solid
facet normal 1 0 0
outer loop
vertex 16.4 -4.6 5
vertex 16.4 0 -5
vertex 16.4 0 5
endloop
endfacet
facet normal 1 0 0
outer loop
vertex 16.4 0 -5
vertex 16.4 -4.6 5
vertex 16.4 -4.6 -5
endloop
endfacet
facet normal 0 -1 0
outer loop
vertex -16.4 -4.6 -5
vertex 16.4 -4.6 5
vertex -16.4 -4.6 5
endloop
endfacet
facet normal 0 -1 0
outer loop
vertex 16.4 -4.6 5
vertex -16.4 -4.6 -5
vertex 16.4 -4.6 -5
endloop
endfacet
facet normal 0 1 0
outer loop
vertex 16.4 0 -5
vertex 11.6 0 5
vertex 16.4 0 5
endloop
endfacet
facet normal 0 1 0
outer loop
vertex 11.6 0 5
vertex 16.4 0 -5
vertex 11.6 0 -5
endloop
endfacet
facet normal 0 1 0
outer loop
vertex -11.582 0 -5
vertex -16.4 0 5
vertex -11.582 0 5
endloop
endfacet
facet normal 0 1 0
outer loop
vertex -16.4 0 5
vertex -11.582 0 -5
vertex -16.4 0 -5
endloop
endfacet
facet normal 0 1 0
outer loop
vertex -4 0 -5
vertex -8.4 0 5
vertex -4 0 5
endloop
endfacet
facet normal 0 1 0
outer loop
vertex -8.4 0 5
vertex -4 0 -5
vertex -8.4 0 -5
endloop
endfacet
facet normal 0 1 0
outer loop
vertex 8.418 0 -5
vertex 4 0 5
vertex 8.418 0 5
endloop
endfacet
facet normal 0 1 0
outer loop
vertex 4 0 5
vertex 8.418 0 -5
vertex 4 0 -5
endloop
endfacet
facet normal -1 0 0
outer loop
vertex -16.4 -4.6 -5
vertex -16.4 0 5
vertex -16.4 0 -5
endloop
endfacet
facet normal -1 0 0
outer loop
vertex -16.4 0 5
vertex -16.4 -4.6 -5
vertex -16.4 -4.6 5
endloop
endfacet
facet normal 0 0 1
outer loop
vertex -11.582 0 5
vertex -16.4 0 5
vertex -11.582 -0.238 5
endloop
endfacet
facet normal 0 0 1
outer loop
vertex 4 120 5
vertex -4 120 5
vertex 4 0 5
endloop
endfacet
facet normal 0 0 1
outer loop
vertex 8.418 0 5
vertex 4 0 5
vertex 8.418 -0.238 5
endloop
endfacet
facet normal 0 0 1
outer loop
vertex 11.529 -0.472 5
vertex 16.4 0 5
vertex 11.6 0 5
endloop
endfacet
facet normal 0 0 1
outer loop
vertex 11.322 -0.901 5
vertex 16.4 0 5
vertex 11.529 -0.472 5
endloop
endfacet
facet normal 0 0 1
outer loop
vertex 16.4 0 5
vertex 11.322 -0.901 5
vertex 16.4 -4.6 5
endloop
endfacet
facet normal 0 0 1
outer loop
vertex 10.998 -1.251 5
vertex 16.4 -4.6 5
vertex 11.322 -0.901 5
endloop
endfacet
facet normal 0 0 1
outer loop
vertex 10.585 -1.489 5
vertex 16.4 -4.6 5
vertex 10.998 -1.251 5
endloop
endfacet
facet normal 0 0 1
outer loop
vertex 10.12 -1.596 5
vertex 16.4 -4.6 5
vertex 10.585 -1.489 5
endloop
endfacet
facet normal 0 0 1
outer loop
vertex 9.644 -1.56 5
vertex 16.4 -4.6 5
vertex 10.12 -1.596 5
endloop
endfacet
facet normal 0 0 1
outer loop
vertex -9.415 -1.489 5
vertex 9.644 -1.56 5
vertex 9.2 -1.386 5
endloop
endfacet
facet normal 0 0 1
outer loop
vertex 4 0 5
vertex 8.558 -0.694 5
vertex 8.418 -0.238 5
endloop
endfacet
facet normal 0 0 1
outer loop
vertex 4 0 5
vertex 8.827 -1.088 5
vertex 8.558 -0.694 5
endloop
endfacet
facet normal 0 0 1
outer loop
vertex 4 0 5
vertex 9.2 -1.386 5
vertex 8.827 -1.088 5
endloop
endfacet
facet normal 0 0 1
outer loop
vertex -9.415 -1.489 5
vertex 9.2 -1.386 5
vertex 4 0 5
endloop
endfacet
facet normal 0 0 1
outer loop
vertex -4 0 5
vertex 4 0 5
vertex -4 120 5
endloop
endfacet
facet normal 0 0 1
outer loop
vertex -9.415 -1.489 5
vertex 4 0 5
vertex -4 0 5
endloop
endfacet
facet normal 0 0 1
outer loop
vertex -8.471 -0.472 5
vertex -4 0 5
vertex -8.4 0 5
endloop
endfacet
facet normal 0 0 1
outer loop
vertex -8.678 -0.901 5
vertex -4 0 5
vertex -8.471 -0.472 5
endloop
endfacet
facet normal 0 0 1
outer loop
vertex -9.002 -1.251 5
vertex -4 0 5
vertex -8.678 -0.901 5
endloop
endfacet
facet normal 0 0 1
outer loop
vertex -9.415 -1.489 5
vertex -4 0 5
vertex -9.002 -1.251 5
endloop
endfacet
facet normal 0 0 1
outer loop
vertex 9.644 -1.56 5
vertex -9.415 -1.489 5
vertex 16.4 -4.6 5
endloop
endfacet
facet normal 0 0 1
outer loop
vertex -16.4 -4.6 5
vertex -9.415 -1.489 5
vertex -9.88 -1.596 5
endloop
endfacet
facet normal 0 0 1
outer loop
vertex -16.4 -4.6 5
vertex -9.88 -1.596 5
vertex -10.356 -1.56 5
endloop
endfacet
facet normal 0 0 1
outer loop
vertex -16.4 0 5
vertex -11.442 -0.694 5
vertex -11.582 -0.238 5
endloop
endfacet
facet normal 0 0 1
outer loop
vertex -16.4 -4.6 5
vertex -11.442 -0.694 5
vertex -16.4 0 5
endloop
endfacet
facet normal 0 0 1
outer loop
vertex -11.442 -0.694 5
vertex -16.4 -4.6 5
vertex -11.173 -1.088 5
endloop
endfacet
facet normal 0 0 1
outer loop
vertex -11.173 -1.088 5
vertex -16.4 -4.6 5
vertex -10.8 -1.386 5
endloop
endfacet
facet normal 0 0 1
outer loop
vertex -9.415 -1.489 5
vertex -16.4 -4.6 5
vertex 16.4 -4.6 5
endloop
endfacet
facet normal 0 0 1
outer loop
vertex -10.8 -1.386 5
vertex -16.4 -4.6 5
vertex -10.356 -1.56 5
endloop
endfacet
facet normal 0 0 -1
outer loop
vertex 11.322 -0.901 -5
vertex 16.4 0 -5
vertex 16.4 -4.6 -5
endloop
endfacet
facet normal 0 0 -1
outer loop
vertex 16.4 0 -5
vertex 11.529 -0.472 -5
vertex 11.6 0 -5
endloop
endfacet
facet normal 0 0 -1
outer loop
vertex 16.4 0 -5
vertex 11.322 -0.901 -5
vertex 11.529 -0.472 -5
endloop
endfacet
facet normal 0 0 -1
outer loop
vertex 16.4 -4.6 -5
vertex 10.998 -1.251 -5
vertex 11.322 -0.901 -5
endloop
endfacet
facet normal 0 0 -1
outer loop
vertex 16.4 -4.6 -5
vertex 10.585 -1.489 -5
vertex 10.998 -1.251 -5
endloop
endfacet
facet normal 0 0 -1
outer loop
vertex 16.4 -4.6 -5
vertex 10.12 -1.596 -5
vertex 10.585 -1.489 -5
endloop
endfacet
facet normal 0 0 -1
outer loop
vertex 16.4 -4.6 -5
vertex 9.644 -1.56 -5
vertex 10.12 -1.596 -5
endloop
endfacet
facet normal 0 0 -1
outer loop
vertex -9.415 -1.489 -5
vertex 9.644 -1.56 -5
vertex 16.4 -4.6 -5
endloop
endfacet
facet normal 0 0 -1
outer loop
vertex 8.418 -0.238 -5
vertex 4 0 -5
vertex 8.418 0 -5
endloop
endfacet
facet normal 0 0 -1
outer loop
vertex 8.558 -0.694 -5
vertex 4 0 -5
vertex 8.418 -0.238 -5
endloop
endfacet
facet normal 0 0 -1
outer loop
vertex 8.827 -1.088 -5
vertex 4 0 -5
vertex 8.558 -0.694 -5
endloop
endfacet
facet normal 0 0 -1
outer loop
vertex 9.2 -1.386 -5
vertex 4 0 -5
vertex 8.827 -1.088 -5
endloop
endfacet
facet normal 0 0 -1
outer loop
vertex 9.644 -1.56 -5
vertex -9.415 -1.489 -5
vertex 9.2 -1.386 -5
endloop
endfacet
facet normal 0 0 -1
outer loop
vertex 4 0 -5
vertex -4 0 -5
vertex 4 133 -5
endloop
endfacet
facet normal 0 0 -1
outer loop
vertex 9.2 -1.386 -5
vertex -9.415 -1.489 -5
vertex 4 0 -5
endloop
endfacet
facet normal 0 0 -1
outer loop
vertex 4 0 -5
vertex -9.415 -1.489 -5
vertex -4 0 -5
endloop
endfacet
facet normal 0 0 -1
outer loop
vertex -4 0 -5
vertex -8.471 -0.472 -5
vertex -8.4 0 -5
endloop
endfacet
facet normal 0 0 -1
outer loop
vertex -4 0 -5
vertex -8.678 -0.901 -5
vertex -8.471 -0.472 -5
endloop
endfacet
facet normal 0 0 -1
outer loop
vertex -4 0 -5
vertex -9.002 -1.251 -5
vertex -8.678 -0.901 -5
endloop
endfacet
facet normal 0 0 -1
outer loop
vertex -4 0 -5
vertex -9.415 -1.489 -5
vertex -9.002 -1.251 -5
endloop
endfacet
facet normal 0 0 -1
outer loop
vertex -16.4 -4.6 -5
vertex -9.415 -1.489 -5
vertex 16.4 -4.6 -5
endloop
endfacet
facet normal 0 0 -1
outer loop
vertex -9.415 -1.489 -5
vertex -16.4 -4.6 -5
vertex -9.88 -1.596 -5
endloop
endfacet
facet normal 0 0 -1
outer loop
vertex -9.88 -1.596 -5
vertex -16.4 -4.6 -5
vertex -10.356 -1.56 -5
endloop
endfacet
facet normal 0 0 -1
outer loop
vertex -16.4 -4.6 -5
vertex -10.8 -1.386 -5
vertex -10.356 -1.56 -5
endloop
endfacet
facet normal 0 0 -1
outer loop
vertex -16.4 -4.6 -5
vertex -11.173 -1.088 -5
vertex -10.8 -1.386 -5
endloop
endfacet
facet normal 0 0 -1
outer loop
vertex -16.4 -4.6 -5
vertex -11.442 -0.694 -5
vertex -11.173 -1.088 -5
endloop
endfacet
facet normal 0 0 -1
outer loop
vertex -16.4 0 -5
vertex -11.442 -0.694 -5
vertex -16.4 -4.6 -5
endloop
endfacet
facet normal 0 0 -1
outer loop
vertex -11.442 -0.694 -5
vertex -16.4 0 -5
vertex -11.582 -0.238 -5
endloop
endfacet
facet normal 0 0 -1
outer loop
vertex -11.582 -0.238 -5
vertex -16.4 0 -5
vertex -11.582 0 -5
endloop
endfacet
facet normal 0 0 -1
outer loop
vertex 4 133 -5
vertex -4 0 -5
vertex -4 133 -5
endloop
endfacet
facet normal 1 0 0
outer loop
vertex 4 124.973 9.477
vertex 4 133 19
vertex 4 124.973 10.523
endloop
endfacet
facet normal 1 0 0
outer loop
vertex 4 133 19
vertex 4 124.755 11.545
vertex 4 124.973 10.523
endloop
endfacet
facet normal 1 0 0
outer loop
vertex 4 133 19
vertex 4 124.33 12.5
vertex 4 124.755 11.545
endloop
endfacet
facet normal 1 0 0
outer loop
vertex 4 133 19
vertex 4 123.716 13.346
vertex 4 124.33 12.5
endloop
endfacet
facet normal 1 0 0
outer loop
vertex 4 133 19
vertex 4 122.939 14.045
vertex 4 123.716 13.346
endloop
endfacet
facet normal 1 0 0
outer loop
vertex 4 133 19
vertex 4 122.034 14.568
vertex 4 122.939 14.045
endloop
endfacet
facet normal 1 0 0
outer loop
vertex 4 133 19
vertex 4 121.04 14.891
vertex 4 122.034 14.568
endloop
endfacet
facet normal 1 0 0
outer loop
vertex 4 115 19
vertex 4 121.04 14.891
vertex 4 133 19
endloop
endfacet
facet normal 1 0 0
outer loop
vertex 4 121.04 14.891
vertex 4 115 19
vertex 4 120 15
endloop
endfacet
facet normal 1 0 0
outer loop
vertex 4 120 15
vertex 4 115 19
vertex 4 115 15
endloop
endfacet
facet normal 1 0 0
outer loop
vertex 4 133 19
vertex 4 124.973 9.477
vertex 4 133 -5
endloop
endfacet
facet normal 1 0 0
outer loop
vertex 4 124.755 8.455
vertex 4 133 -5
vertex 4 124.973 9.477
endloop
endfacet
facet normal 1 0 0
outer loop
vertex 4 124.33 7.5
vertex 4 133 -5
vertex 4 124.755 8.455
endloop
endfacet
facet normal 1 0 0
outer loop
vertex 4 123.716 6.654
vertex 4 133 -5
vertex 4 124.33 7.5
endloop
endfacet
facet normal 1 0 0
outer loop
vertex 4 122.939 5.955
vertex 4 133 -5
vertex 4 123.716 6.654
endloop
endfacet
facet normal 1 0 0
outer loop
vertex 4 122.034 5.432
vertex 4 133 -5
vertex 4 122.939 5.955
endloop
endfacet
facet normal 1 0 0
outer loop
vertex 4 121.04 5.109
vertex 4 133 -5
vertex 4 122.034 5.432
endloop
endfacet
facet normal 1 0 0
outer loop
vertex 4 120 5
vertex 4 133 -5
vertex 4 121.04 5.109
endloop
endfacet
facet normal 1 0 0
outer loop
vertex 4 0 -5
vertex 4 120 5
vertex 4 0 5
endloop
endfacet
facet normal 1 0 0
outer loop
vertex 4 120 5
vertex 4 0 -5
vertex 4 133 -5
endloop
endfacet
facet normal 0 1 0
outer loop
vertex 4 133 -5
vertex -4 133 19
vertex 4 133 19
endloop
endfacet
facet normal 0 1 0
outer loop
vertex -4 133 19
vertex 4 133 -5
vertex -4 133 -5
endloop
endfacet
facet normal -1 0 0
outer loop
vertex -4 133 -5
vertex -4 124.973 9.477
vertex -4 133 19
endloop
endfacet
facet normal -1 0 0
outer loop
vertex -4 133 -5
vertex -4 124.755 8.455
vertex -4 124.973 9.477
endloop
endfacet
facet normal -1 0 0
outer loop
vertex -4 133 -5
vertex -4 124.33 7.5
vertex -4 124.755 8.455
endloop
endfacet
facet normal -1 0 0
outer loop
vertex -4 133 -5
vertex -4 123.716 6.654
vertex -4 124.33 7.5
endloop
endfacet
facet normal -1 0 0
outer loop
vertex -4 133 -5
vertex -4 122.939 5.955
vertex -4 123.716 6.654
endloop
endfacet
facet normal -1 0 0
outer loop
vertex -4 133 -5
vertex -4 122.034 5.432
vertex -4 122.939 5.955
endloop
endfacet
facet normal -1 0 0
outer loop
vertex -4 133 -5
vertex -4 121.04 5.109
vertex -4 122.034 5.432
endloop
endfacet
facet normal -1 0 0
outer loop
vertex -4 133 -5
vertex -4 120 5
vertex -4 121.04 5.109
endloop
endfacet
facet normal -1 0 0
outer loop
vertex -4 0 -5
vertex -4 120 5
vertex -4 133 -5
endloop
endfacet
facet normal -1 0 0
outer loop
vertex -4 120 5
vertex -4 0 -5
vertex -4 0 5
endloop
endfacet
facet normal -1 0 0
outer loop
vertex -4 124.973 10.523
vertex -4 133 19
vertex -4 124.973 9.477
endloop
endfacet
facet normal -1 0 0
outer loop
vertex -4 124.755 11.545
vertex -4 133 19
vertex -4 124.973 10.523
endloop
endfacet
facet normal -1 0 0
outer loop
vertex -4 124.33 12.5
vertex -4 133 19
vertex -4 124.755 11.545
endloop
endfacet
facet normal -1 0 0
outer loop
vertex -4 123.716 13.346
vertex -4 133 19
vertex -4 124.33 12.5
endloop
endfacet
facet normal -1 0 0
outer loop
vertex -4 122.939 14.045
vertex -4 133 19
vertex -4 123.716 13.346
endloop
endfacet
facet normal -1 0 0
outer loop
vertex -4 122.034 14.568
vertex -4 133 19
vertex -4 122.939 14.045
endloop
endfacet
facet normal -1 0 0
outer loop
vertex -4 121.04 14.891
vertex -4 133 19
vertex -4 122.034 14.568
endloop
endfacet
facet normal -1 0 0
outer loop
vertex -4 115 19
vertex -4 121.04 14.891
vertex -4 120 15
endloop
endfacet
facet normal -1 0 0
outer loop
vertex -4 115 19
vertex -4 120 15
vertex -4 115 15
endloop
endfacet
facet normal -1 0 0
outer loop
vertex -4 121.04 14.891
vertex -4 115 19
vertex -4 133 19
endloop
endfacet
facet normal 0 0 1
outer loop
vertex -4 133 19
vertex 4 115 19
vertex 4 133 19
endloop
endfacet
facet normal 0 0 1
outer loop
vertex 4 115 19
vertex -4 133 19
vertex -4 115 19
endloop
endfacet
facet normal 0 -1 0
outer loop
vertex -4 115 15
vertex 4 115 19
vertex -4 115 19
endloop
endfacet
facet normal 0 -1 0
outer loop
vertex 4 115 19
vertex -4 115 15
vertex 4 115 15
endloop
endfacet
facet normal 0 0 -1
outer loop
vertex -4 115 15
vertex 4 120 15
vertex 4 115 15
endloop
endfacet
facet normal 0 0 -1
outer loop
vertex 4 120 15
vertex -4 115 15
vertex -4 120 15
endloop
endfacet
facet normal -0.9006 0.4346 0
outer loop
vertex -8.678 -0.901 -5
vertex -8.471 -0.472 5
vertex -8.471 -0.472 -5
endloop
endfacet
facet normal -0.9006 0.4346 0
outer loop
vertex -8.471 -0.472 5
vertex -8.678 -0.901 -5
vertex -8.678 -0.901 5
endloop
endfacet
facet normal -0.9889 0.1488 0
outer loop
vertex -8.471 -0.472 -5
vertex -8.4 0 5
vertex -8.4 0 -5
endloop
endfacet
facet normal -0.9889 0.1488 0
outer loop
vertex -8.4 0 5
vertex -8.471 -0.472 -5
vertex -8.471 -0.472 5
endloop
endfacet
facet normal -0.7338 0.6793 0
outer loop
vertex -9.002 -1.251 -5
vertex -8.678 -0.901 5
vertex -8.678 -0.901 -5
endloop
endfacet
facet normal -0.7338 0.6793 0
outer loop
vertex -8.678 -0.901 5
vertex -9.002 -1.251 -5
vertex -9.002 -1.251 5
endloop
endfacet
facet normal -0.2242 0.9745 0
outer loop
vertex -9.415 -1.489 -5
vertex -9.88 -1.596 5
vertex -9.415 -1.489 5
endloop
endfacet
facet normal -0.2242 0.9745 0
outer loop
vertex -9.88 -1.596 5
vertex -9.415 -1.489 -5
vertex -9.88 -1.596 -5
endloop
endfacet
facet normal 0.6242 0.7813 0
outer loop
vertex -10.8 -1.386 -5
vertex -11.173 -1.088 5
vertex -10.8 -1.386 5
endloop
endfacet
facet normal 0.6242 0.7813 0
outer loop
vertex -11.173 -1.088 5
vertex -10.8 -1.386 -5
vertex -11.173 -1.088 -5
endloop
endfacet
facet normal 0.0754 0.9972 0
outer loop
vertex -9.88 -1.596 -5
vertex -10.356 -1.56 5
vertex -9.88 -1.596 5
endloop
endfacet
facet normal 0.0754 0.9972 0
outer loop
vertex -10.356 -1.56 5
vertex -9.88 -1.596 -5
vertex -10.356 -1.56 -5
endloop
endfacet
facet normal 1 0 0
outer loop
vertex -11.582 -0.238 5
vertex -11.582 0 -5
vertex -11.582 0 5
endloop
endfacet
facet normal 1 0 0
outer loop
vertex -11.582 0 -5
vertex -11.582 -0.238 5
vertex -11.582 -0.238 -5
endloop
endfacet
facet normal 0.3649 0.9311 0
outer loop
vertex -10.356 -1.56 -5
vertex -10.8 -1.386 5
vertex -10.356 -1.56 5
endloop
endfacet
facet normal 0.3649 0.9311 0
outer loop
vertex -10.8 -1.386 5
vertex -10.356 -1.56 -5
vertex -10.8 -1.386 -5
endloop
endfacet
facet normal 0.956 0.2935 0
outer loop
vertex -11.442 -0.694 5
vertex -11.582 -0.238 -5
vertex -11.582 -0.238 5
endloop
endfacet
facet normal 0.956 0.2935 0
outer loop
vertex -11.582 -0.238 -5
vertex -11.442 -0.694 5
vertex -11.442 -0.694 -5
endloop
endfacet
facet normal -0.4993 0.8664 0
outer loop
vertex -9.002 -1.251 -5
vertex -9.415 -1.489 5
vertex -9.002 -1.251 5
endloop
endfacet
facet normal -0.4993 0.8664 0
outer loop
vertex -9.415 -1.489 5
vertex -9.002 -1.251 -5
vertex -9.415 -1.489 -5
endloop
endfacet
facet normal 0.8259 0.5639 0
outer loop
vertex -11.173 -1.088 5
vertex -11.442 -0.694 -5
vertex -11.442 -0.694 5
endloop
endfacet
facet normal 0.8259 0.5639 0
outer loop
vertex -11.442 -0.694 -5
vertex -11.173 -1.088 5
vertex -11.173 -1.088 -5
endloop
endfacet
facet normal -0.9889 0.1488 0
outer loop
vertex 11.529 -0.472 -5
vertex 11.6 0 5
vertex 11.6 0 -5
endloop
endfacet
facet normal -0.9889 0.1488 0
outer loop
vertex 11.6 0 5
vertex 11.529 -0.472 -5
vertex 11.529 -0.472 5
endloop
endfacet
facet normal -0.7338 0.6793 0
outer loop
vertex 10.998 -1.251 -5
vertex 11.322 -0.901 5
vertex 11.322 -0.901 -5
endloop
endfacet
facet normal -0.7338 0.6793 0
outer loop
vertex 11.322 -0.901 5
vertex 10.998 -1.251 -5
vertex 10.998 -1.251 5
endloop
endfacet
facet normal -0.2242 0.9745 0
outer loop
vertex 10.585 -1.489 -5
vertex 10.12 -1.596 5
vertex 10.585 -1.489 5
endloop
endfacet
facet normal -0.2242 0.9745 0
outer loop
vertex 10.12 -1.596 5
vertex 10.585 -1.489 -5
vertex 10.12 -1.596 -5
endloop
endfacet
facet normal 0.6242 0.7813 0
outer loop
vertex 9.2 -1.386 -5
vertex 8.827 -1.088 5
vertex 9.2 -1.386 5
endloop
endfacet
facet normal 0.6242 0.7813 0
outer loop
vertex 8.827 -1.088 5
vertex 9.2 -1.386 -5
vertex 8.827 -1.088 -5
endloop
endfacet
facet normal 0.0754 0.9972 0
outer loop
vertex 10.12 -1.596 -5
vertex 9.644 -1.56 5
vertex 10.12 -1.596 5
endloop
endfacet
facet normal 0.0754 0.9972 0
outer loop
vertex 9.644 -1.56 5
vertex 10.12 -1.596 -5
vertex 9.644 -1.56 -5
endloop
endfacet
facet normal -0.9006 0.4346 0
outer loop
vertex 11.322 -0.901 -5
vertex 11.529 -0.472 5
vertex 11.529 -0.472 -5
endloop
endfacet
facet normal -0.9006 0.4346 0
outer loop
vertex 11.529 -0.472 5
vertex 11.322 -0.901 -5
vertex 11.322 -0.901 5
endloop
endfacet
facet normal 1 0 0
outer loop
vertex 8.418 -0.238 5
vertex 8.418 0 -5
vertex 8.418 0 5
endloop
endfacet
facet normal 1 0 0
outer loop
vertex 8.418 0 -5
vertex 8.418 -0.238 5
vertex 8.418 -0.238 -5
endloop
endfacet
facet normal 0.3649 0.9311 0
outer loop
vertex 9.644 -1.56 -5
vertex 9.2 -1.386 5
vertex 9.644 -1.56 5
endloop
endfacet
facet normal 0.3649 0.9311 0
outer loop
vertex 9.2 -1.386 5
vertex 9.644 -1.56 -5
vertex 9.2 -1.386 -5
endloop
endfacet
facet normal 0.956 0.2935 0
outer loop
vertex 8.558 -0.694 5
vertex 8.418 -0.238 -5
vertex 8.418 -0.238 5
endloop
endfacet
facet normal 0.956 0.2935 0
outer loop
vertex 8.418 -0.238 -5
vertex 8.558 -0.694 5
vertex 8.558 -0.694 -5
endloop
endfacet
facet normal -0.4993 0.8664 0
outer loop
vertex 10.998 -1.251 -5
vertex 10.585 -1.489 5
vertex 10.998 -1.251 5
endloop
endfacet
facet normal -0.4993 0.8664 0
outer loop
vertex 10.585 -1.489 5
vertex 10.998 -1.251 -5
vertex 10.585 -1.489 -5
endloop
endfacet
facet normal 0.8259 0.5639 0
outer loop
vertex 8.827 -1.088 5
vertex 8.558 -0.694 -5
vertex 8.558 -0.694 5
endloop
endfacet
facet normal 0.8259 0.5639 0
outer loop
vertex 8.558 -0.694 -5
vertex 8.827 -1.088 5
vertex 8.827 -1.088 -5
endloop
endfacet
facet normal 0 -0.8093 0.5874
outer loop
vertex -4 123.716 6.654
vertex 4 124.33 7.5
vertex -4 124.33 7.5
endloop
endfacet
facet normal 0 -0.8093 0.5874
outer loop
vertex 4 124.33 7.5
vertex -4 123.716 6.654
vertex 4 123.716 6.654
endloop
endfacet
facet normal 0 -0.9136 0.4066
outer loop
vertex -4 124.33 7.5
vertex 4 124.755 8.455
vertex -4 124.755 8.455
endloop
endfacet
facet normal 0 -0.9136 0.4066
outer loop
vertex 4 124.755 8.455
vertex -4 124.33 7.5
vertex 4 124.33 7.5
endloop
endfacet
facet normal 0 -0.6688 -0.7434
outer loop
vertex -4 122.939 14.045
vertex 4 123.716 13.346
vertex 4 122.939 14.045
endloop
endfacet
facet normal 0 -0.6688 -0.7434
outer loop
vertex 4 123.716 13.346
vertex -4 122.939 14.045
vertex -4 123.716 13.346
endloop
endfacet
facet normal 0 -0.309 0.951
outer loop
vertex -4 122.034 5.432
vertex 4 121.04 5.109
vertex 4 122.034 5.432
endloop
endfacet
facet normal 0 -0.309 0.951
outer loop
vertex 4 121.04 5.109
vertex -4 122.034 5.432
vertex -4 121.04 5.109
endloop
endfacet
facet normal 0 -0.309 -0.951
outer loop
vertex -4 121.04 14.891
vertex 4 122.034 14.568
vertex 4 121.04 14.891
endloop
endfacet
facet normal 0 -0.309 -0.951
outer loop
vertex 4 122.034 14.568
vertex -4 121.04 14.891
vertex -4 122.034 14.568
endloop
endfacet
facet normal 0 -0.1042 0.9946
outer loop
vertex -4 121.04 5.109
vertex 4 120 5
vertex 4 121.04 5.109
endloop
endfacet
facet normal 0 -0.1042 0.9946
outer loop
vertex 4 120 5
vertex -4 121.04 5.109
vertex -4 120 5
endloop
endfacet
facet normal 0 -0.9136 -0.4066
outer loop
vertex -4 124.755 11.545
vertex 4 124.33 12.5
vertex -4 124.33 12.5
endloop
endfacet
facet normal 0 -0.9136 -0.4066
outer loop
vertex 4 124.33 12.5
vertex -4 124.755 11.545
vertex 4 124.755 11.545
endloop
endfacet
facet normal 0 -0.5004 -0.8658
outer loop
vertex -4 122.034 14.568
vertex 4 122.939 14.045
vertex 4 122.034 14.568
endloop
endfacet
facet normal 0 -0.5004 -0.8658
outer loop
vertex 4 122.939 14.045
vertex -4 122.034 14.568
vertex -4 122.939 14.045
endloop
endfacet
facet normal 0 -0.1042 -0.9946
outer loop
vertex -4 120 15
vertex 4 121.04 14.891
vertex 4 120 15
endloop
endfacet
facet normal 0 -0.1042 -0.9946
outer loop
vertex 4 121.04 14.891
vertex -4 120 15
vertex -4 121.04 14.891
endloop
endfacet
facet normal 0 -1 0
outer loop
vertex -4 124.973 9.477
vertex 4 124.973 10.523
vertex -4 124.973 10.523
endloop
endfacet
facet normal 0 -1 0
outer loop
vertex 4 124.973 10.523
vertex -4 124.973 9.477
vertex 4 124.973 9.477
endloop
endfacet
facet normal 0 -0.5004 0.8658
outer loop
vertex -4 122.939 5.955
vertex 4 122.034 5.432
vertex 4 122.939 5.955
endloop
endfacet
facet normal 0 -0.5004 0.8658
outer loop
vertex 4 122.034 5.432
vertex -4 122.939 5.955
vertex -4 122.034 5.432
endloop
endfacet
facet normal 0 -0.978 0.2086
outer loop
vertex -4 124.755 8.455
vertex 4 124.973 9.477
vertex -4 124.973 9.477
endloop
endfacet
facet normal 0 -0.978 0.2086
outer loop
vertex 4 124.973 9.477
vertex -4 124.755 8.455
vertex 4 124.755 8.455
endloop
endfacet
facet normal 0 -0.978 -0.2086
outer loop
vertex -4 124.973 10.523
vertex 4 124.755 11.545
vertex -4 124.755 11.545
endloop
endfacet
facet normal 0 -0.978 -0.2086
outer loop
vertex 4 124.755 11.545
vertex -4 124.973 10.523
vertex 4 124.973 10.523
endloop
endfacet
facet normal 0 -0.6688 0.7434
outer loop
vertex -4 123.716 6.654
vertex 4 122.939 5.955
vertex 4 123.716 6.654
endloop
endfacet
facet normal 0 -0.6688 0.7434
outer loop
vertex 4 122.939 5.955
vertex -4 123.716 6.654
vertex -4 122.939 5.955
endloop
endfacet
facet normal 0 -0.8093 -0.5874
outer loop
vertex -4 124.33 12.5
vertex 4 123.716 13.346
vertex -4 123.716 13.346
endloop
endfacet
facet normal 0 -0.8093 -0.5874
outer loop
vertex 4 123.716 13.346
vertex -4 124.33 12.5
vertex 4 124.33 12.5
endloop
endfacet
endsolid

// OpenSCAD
// WireShelfSpoolHanger
//    2021-03-02 Jeff Spirko <spirko@gmail.com>, CC-BY-SA 4.0
// This is intended to allow hanging the spool hanger form a wire shelf
//  above the printer.

// These are the dimensions of a set of shelves from a
//   large hardware store chain in the US.
wire_diameter = 3.2;
wire_spacing = 20;

// echo(wire_spacing);

// Horizontal plate dimensions.  The width must be less than 
//   the spacing if it's to be installed from below.
l_plate = 1*wire_spacing + 4*wire_diameter;
w_plate = 10;
// Thickness of the thinnest part of the plate.
t_plate = 3;
// Full thickness of the plate
t_full = t_plate + wire_diameter/2;

// Mount dimensions, except where widened to make room for the holes.
t_mount = 8;
l_mount = 130;

// These are the mount points, spaced for the Creality spool mount
//   that came with the Ender 3 V2.
hole_spacing = 24;
hole_diameter = 5;

hanger_d = 10;

// Quality of holes.
$fs = 0.5;

// Easier to print upside-down
rotate([90,0,0]) {

  difference() { 
    union() {
      // Horizontal plate.
      translate([0,0,t_full/2]) 
        cube([l_plate, w_plate, t_full], center=true);
      // Vertical mounting block.
      translate([0,0,-l_mount/2-t_plate/2])
        cube([t_mount, w_plate, l_mount + t_plate], center=true);

      translate([0, hanger_d/2 + t_mount/4 + w_plate/2,-l_mount+hanger_d/2-t_plate/2]) 
        cube([t_mount, hanger_d + t_mount/2, hanger_d + t_plate], center=true);

      translate([0, hanger_d + t_mount/4 + w_plate/2,-l_mount+hanger_d]) 
        cube([t_mount, t_mount/2, hanger_d], center=true);
    }
    // Grooves for shelf wires
    for(i=[-0.5:1:0.5]) {
      translate([i*wire_spacing,0,0]) rotate([90,0,0])
        cylinder(r=wire_diameter/2, h=w_plate+1, center=true);
    }
    translate([0,w_plate/2+hanger_d/2,-l_mount+hanger_d]) rotate([90,0,90])
      cylinder(d=hanger_d, h=w_plate+1, center=true);
  }

}
